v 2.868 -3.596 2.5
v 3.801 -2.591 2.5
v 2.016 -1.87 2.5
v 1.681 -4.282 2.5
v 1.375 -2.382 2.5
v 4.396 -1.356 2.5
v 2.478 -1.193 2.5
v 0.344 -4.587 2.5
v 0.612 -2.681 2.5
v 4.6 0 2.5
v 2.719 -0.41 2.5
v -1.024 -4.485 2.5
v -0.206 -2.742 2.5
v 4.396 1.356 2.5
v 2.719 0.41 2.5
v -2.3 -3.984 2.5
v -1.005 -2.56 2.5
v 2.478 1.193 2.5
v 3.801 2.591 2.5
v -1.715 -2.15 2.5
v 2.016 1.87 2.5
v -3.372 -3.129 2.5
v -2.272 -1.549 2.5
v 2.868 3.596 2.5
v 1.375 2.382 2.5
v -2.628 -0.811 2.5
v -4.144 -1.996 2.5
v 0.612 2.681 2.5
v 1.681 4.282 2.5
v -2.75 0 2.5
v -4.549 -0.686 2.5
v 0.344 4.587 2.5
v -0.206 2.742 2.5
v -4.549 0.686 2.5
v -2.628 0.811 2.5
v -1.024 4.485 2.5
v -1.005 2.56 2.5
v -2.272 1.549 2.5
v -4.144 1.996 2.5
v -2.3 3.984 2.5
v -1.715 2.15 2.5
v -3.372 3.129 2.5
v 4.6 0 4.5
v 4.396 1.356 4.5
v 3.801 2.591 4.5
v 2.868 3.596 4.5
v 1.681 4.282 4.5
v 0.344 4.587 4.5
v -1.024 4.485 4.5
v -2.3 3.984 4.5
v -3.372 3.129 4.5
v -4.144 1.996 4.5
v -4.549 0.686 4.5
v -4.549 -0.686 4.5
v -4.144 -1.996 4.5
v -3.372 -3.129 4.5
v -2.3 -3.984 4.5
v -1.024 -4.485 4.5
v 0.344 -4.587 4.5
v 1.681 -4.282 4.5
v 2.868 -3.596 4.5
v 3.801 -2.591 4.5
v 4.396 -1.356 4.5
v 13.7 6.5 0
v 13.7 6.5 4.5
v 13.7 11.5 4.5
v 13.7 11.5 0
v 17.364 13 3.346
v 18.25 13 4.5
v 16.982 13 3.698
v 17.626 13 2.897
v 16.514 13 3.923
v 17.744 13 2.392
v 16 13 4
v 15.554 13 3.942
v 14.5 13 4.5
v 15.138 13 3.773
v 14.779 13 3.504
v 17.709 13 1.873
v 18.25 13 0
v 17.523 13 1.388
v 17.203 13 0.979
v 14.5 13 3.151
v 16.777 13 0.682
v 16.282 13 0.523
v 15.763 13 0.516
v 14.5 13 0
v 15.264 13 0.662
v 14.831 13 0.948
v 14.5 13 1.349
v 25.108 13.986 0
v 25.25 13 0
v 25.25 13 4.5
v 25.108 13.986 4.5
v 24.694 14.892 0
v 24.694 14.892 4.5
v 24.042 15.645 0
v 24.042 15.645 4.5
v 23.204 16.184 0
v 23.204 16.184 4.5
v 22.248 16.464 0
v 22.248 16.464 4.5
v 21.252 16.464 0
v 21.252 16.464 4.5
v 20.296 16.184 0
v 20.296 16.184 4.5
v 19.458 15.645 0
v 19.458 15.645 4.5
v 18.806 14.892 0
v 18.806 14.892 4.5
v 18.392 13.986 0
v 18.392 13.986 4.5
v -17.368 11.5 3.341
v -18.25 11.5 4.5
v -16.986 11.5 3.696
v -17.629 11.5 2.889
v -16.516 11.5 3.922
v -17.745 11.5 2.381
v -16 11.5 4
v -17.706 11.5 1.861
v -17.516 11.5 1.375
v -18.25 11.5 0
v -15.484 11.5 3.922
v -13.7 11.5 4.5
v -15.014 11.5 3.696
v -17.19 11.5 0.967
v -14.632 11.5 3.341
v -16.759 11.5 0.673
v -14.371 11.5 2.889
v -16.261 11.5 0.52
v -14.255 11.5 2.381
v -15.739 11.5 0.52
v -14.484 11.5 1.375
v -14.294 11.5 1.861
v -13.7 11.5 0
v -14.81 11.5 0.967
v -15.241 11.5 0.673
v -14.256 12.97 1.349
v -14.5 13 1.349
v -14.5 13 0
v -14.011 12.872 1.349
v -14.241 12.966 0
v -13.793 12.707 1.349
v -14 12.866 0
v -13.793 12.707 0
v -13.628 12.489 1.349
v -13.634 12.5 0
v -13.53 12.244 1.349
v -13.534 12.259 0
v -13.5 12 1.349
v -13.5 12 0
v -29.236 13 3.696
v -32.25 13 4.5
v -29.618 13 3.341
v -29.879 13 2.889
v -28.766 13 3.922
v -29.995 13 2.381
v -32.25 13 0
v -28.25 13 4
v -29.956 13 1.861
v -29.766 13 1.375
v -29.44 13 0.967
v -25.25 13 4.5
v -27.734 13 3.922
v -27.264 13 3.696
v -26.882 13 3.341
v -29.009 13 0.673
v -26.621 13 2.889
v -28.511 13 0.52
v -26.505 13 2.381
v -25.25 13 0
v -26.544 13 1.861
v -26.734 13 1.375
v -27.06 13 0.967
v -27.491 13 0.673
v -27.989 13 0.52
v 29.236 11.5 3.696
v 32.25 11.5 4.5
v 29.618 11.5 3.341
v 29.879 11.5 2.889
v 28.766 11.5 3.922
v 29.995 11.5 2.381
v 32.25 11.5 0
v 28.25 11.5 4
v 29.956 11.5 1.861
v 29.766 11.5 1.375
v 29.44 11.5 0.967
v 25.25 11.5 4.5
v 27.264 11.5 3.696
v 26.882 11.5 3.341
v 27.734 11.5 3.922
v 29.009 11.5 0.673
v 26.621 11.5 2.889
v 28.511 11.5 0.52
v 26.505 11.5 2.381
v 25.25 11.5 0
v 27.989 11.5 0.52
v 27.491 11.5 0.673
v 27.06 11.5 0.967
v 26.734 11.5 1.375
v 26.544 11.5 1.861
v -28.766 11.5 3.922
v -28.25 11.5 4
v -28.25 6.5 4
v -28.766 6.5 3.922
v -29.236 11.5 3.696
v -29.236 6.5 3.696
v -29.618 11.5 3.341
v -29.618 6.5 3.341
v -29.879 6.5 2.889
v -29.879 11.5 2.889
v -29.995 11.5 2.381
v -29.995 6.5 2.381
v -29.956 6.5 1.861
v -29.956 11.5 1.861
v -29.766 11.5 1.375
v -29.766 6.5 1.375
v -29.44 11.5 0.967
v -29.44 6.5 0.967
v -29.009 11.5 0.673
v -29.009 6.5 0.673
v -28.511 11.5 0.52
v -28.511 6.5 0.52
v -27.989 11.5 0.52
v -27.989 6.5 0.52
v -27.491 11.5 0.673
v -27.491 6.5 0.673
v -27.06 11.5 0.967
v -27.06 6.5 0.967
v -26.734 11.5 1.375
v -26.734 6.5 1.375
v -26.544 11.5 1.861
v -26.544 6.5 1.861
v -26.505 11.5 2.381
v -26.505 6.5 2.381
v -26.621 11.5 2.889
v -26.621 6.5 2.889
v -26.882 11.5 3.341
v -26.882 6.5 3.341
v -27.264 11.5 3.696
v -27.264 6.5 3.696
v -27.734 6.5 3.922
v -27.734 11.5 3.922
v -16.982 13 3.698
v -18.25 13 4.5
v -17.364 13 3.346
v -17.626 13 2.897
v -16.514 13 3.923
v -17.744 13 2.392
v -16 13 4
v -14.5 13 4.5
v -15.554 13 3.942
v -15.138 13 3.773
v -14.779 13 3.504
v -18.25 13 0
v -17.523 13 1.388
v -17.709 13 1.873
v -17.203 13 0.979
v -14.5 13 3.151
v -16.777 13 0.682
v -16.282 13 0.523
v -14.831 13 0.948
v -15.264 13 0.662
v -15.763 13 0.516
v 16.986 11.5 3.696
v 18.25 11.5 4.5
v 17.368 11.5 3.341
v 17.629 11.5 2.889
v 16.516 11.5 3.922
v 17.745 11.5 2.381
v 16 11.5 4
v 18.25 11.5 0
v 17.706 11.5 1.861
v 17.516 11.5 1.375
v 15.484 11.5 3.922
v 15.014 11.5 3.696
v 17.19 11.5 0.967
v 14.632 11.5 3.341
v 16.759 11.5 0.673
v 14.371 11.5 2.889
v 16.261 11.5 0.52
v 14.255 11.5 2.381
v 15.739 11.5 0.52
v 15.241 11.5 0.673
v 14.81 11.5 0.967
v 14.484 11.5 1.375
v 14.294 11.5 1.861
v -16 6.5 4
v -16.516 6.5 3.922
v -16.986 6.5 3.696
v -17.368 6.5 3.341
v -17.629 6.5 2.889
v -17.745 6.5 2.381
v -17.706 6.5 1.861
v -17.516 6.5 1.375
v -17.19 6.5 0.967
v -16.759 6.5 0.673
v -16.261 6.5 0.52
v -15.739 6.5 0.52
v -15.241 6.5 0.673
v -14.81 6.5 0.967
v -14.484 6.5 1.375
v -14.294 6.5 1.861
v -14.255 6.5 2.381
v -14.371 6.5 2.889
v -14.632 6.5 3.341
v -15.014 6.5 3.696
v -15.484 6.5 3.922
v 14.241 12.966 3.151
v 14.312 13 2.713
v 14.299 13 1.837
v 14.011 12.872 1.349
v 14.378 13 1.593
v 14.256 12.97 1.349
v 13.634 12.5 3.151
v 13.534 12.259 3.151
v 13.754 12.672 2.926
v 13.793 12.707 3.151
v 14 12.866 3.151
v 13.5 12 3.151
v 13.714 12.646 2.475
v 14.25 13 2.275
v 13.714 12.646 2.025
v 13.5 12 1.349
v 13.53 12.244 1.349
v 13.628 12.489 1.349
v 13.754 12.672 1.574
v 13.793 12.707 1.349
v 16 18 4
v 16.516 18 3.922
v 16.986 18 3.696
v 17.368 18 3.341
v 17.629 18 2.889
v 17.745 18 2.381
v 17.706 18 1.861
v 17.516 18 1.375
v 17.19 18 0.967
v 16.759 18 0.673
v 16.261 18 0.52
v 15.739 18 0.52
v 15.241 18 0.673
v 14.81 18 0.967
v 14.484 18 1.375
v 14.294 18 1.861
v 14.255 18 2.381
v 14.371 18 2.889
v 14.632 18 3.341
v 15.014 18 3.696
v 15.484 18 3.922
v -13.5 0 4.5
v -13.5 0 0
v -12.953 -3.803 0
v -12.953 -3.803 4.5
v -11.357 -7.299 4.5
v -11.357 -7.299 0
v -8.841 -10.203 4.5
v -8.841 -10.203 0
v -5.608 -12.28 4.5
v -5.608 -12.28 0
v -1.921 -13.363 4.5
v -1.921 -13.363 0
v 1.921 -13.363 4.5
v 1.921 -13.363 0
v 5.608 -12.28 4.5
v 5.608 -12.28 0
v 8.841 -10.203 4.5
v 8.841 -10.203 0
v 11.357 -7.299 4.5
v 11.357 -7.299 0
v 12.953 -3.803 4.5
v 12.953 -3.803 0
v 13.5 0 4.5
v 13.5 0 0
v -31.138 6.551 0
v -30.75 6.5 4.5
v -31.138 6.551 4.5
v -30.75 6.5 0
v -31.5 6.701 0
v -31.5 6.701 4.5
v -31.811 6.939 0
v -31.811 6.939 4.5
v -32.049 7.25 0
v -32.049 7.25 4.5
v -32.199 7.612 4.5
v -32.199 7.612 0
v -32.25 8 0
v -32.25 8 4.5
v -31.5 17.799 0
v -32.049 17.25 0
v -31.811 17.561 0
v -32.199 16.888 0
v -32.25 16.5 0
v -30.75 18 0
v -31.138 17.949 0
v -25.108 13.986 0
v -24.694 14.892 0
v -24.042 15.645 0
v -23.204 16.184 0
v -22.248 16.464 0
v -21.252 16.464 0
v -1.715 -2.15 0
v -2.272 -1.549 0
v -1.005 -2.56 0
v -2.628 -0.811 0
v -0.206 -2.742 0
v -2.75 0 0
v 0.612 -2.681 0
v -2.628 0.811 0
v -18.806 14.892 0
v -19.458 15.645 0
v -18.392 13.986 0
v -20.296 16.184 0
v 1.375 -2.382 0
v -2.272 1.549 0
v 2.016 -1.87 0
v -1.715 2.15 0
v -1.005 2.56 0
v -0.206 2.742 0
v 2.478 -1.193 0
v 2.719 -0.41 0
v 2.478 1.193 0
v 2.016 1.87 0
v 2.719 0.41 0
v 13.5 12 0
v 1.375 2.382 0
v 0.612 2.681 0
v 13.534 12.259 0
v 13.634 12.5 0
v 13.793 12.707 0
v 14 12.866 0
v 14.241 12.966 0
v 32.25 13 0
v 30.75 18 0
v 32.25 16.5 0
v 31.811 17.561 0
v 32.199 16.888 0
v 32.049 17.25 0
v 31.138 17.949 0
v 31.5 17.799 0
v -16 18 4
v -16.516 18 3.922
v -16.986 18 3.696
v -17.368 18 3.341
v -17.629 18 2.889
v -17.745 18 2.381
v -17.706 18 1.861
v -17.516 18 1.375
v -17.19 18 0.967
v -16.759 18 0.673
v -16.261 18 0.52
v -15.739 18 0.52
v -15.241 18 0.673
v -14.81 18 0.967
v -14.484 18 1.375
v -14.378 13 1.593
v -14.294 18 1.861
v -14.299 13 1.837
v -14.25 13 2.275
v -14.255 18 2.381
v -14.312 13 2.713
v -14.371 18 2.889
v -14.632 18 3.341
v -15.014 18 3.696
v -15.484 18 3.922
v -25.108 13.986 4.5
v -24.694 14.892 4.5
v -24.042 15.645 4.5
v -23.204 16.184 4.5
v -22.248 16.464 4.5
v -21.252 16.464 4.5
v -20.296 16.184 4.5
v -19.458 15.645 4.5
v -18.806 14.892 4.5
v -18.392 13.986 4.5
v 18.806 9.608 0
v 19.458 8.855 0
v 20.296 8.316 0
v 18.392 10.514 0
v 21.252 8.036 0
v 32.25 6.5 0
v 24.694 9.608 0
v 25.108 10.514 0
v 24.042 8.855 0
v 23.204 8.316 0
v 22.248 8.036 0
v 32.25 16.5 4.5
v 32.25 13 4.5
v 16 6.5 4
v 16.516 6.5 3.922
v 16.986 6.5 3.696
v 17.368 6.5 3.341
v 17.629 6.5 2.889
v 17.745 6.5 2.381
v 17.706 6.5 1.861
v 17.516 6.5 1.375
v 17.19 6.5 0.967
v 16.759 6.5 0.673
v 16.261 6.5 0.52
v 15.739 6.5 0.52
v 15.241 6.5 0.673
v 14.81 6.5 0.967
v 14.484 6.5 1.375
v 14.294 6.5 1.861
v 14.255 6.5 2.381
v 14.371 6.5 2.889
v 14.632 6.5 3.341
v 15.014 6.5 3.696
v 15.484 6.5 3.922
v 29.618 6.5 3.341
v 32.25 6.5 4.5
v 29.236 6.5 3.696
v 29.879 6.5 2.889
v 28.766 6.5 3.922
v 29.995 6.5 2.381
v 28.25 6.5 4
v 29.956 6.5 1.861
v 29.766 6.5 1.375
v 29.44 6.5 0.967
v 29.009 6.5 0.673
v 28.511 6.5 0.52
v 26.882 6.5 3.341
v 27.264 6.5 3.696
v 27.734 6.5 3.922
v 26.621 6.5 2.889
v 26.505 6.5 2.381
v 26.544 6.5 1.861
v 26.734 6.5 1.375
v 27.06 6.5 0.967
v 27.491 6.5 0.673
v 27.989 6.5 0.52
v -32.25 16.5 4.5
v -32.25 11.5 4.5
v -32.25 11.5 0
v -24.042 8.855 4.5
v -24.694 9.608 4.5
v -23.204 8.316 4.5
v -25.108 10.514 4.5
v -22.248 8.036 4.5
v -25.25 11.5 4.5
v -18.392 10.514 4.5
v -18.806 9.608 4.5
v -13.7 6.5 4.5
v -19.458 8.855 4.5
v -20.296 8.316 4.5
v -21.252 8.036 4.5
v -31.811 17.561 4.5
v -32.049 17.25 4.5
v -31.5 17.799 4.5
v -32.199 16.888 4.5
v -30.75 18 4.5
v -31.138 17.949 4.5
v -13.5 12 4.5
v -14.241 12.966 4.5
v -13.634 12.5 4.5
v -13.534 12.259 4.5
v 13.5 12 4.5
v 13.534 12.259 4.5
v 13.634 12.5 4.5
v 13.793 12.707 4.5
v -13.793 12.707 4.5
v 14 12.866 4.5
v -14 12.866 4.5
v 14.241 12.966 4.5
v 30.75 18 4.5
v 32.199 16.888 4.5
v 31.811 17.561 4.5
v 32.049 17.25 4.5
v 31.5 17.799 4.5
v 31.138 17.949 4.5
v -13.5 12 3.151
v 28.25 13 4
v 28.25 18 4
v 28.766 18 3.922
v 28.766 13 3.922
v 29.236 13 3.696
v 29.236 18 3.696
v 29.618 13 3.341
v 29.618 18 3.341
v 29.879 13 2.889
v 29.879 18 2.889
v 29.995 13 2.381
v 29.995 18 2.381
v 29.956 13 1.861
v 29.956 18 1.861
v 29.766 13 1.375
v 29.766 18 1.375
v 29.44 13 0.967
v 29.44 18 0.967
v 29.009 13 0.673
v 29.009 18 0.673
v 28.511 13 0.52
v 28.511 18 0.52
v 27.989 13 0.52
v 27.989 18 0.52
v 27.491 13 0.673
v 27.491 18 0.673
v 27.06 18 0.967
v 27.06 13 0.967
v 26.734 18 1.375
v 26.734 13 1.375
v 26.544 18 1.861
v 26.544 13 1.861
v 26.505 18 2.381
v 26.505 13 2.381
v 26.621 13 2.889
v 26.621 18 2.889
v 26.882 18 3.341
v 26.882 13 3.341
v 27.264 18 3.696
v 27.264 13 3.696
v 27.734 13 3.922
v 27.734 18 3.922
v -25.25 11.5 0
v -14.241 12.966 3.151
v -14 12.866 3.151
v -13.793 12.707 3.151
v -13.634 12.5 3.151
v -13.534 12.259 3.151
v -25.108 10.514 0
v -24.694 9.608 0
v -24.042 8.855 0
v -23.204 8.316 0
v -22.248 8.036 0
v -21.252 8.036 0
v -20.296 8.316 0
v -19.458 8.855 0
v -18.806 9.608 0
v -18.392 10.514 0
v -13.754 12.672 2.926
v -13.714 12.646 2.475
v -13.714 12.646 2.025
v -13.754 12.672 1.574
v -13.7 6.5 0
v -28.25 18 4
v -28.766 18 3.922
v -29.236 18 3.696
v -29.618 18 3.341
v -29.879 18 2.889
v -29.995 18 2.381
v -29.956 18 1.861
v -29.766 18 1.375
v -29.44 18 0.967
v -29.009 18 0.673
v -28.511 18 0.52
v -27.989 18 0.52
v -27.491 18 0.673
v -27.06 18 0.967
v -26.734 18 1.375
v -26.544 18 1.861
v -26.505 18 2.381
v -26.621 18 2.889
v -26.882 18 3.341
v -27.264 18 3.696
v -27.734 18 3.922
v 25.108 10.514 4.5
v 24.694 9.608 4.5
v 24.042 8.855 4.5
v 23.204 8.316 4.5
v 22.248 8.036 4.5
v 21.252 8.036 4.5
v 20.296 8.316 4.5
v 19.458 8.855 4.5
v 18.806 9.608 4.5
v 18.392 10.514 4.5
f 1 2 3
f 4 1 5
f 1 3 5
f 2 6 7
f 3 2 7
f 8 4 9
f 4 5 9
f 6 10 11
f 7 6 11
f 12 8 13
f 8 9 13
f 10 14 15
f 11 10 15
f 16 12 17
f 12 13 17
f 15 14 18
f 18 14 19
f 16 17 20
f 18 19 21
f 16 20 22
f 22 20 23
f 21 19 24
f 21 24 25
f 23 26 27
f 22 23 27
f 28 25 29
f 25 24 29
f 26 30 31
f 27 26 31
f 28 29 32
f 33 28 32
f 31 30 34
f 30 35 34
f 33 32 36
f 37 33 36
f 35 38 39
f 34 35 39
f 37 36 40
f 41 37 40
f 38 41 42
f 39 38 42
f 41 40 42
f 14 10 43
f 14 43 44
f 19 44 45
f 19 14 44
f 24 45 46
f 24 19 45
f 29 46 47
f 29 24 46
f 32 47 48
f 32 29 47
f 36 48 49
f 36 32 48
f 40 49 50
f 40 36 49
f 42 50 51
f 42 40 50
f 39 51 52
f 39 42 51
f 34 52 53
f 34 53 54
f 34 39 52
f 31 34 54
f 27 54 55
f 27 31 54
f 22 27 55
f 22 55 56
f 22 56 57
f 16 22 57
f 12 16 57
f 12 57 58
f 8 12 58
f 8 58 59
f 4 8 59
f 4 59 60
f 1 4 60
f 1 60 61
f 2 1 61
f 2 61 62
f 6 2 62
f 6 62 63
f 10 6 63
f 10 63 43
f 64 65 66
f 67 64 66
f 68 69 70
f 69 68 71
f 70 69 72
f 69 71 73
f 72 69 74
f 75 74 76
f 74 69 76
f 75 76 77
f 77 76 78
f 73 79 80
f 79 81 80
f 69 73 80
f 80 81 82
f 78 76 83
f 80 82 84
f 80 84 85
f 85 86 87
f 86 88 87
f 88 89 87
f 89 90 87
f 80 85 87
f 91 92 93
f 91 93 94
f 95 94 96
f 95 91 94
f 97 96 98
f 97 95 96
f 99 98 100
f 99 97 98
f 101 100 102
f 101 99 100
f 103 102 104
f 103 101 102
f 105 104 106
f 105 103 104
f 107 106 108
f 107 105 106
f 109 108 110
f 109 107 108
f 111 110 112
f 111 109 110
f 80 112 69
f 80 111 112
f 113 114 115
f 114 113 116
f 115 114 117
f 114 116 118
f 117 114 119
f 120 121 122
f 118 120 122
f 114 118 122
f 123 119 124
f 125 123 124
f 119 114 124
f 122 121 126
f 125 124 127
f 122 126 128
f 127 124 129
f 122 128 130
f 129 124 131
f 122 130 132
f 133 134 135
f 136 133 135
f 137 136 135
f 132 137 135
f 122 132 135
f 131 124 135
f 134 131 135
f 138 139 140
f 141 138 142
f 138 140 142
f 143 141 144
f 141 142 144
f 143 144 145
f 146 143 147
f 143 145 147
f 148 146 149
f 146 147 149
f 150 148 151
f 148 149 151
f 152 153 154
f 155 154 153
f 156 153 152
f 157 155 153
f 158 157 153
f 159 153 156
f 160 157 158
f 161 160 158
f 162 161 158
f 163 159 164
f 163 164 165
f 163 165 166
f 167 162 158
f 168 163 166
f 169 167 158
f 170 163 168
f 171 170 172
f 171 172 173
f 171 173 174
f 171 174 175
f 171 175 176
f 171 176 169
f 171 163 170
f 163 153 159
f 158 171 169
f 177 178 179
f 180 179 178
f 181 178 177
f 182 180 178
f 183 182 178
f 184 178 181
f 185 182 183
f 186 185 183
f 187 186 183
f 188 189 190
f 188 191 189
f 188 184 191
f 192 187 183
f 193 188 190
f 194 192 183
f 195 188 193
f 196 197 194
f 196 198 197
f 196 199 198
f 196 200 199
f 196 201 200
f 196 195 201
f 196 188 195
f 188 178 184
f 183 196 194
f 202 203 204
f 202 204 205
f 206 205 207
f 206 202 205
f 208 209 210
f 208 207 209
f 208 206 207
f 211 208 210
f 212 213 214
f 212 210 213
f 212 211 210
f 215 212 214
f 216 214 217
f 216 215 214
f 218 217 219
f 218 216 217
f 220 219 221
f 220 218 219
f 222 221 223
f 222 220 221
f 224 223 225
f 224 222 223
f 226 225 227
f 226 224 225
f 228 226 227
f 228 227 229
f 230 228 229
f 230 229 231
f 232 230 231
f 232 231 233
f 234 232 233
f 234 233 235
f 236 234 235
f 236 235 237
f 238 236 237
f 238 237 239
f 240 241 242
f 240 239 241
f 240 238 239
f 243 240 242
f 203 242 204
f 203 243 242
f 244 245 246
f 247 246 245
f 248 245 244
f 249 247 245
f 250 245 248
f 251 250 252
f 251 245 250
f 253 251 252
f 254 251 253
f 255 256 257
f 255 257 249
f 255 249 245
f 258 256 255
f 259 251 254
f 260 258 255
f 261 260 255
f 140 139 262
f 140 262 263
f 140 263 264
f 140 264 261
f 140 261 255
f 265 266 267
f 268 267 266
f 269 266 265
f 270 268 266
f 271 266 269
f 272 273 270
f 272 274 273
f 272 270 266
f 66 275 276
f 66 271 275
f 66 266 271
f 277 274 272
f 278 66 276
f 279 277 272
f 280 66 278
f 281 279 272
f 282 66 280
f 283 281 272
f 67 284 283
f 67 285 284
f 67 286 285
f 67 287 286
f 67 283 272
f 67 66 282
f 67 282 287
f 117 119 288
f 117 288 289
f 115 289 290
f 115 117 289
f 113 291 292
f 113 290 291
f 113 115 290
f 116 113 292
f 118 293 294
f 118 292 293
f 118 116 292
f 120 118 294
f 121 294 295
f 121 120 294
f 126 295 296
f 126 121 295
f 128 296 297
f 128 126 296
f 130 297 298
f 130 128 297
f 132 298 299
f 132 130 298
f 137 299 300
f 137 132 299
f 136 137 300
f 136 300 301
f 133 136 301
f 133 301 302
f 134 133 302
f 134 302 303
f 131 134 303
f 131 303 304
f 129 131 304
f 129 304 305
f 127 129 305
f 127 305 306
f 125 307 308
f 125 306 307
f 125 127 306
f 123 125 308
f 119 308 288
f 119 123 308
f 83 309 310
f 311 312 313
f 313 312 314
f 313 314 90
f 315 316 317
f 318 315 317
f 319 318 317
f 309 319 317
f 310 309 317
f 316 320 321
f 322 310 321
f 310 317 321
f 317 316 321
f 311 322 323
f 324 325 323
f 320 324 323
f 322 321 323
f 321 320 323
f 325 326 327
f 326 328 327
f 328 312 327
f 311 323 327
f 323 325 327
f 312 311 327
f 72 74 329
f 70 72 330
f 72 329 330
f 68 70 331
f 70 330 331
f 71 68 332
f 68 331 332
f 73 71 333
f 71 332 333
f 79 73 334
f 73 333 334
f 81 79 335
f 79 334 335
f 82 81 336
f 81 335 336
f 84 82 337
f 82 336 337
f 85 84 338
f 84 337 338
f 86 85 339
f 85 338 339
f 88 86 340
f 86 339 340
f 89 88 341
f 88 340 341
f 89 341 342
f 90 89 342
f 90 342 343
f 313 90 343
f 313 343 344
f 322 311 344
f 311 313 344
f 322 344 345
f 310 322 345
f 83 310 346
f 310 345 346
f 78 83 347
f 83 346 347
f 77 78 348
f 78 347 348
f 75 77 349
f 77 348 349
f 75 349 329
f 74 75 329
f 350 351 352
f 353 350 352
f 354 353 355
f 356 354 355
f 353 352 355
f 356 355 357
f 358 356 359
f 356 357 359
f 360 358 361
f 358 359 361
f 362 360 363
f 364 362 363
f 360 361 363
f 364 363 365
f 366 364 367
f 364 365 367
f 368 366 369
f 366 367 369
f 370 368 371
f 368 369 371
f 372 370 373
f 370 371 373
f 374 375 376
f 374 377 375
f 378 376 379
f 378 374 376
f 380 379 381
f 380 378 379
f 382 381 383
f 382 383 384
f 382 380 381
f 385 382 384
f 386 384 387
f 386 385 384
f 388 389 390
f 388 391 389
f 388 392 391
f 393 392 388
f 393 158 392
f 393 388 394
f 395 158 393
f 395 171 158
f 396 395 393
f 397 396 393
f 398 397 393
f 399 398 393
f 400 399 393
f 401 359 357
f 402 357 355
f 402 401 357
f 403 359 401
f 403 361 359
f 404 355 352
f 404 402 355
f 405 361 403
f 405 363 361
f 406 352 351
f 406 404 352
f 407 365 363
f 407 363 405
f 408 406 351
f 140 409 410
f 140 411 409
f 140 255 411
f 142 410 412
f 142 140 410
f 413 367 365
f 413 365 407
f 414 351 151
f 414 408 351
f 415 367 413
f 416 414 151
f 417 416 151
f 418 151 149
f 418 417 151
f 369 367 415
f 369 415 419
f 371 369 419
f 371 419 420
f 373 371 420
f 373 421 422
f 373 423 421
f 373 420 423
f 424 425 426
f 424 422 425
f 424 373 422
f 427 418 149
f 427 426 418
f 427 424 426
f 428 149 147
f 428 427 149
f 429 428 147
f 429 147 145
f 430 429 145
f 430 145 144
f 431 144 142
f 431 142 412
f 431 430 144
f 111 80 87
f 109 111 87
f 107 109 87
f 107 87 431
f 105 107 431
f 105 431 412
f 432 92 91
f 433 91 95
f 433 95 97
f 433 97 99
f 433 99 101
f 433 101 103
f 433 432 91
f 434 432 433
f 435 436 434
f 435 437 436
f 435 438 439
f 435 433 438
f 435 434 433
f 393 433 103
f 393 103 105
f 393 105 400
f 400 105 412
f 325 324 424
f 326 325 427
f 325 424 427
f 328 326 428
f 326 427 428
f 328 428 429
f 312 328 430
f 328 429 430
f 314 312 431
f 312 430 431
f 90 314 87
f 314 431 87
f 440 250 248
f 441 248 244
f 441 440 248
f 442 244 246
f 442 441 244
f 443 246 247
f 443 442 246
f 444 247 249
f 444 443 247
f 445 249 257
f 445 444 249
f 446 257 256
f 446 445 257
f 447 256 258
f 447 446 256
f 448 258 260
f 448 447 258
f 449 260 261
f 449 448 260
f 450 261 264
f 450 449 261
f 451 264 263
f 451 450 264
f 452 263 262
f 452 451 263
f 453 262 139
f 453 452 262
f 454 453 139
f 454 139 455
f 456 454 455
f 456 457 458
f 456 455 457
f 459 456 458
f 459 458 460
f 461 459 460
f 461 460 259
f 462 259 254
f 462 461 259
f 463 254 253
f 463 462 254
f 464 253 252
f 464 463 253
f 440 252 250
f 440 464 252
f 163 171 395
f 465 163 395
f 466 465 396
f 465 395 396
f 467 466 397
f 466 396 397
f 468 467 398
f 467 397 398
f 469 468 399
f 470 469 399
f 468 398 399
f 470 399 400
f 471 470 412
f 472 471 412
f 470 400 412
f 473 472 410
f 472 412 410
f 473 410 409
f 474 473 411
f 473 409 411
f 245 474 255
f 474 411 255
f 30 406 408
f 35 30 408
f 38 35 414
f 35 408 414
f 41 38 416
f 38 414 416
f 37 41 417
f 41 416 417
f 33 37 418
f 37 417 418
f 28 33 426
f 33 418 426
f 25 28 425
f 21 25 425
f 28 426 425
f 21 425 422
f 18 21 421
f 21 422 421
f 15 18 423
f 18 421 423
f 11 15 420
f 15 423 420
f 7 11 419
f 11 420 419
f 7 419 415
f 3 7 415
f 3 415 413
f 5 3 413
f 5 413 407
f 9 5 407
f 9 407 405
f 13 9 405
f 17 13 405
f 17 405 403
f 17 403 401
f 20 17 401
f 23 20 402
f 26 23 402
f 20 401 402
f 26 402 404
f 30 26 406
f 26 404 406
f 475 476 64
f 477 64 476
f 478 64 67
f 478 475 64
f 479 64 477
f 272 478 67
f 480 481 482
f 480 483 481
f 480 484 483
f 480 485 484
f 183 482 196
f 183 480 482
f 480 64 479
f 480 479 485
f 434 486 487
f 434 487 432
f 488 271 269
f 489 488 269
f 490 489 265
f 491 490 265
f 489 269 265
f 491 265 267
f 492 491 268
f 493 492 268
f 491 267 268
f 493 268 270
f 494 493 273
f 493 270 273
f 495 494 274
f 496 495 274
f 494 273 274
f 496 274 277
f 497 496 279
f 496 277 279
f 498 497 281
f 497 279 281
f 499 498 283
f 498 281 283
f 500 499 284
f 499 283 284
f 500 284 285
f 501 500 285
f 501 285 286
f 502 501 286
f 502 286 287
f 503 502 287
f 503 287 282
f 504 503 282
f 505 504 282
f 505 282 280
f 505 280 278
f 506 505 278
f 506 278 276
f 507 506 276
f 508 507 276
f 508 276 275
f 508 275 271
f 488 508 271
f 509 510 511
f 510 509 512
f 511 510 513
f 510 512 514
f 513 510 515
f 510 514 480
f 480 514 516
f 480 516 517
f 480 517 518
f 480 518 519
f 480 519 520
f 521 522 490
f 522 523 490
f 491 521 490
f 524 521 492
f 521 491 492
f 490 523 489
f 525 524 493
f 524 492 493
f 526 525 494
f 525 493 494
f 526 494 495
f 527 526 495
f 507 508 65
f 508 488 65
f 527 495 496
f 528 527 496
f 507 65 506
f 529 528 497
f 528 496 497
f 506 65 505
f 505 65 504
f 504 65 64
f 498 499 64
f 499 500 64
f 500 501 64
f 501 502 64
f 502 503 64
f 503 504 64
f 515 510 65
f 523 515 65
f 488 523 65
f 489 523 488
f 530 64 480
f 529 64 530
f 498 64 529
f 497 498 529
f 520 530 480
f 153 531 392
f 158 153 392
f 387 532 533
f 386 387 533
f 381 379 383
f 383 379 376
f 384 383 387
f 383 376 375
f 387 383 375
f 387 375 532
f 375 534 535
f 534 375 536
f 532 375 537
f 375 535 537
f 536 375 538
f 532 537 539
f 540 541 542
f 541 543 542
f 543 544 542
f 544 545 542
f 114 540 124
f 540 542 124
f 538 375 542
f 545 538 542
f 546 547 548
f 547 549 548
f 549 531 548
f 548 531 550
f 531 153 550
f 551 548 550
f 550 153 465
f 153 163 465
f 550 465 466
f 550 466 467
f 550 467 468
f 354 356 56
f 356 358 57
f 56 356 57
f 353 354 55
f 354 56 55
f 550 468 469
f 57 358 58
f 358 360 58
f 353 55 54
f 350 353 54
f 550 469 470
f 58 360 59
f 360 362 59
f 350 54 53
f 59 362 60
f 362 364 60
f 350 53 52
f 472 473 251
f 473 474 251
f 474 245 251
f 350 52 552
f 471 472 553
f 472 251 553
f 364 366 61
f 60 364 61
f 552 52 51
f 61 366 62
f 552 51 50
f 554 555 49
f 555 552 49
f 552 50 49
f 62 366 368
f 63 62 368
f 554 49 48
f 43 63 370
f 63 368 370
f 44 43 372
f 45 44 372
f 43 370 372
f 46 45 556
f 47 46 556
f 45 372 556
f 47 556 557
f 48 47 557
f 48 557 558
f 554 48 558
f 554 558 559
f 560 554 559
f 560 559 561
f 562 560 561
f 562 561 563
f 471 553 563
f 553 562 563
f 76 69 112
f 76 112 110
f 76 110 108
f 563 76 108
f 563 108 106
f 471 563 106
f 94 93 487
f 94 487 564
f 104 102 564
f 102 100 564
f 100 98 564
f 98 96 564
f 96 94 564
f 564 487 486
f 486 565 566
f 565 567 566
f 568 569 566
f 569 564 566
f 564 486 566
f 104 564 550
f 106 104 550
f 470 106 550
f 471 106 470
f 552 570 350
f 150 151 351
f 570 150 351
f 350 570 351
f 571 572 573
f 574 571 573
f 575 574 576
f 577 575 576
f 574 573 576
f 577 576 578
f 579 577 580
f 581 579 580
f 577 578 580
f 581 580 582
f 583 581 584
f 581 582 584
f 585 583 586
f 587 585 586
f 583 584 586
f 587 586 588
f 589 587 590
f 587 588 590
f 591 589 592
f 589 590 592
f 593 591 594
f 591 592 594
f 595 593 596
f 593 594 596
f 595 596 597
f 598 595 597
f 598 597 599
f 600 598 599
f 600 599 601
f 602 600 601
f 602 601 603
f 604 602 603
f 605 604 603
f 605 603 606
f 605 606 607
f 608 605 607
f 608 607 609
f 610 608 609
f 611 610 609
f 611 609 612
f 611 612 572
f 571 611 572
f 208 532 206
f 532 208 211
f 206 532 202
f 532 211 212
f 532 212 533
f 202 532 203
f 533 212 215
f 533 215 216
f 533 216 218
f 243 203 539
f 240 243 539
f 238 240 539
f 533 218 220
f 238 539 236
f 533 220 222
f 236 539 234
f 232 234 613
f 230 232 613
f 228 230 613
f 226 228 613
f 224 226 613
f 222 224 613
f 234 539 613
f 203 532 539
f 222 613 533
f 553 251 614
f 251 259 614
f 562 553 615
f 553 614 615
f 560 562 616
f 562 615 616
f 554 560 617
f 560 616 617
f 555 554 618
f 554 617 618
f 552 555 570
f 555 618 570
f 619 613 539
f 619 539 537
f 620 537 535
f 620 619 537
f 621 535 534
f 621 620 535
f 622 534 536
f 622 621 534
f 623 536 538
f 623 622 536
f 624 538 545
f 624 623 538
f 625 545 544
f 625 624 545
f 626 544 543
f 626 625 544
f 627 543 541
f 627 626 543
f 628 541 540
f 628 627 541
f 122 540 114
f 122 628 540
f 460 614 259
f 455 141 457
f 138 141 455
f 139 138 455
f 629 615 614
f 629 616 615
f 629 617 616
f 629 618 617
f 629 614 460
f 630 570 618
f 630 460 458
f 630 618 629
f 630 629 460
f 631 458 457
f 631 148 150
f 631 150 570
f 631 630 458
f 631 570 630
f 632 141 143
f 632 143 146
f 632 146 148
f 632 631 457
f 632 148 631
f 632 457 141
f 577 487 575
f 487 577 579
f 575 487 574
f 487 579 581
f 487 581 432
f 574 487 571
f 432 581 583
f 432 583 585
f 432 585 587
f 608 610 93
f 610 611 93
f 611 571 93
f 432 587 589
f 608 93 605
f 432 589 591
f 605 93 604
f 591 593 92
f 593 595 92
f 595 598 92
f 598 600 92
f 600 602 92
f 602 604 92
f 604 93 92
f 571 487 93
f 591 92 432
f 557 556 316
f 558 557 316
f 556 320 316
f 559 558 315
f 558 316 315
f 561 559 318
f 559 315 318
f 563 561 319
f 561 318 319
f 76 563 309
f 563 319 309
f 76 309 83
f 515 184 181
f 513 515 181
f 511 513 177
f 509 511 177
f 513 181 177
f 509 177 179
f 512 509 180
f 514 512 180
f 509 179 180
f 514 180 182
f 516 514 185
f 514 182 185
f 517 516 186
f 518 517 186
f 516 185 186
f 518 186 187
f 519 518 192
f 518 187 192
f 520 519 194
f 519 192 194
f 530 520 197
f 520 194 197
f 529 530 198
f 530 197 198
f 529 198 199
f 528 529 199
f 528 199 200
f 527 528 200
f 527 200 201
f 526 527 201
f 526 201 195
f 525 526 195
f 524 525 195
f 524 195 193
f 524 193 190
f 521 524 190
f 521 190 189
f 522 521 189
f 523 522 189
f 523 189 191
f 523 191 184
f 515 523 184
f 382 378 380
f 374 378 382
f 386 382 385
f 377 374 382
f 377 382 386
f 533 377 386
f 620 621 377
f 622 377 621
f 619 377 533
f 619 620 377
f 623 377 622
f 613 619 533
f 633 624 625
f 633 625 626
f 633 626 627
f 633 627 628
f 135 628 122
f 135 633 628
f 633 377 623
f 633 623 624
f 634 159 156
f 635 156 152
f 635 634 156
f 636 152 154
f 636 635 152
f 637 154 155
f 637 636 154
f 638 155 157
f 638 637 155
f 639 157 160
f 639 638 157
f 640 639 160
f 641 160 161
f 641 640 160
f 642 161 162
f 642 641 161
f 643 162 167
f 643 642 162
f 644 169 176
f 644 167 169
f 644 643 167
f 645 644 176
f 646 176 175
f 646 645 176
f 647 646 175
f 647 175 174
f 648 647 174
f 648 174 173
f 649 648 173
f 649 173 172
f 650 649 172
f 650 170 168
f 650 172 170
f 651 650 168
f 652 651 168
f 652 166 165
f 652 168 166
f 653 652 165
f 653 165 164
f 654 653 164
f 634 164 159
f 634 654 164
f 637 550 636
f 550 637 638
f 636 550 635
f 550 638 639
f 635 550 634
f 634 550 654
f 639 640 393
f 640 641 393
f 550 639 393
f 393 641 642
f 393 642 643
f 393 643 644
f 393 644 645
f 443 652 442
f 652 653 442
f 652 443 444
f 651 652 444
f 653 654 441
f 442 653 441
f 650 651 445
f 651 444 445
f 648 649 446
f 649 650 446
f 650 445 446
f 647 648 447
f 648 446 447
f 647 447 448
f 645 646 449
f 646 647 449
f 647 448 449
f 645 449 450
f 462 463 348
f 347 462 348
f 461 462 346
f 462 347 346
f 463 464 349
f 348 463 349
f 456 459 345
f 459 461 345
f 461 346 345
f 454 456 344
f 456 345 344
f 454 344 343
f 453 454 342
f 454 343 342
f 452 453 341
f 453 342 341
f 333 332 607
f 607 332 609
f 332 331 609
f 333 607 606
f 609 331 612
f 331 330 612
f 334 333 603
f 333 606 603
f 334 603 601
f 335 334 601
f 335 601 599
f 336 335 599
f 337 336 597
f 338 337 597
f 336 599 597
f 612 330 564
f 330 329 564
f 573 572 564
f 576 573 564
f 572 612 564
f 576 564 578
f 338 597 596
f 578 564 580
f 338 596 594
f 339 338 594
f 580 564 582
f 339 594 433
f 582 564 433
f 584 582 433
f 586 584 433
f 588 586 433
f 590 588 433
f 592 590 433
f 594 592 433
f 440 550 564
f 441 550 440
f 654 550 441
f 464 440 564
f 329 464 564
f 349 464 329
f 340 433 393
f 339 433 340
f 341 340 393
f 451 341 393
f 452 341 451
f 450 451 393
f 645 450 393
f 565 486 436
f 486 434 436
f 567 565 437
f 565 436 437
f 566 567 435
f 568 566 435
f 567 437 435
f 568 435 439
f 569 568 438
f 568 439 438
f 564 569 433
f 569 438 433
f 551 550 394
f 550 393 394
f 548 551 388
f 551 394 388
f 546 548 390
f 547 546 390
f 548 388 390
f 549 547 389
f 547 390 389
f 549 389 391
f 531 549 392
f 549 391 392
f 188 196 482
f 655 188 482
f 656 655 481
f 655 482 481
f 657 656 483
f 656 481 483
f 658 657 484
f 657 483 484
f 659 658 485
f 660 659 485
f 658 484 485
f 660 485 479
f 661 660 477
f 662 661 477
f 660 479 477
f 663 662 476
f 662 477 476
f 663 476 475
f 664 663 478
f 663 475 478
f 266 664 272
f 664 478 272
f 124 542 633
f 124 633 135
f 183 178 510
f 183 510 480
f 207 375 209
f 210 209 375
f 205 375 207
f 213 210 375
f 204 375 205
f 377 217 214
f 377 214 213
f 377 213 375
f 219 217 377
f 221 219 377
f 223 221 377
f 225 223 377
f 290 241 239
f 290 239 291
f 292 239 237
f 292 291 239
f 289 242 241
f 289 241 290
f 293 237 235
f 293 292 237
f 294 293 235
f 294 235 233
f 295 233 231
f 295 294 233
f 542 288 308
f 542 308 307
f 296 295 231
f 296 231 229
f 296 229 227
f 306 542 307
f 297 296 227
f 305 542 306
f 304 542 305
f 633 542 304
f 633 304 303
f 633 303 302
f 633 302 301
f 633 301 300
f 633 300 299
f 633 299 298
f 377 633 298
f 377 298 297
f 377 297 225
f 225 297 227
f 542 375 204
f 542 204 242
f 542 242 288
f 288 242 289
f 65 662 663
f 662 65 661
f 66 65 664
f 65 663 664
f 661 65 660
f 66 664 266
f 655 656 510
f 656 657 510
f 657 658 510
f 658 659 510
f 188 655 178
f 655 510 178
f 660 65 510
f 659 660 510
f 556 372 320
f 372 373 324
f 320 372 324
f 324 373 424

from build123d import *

# Parameters (mm, degrees)
SKETCH_1_R          = 4.6
EXTRUDE_1_DEPTH     = 4.5
SKETCH_3_R          = 4.6
EXTRUDE_2_DEPTH     = 2.5
SKETCH_4_R          = 2.75
CUT_EXTRUDE_1_DEPTH = 2.5
SKETCH_5_W          = 4.5
SKETCH_5_H          = 5
EXTRUDE_3_DEPTH     = 18.75
CUT_EXTRUDE_2_DEPTH = 18.75
SKETCH_7_R          = 1.75
CUT_EXTRUDE_3_DEPTH = 18.75
SKETCH_9_R          = 1.75
CUT_EXTRUDE_8_DEPTH = 20
SKETCH_13_W         = 0.2
SKETCH_13_H         = 5
CUT_EXTRUDE_4_DEPTH = 10
FILLET_1_R          = 1.5
FILLET_2_R          = 1.5
FILLET_3_R          = 1


with BuildPart() as part:
    # 草图1 → 凸台-拉伸1 (new body)
    with BuildSketch(Plane.XY):
        with BuildLine():
            ThreePointArc((-13.5, 0), (0, -13.5), (13.5, 0))
            Line((13.5, 0), (13.5, 18))
            Line((13.5, 18), (-13.5, 18))
            Line((-13.5, 18), (-13.5, 0))
        make_face()
        Circle(SKETCH_1_R, mode=Mode.SUBTRACT)
    extrude(amount=EXTRUDE_1_DEPTH)

    # 草图3 → 凸台-拉伸2 (add)
    with BuildSketch(Plane(origin=(0, 0, 0), x_dir=(-1, 0, 0), z_dir=(0, 0, -1))):
        Circle(SKETCH_3_R)
    extrude(amount=-EXTRUDE_2_DEPTH)

    # 草图4 → 切除-拉伸1 (cut)
    with BuildSketch(Plane(origin=(0, 0, 0), x_dir=(-1, 0, 0), z_dir=(0, 0, -1))):
        Circle(SKETCH_4_R)
    extrude(amount=-CUT_EXTRUDE_1_DEPTH, mode=Mode.SUBTRACT)

    # 草图5 → 凸台-拉伸3 (add)
    with BuildSketch(Plane(origin=(13.5, 0, 0), x_dir=(0, 0, -1), z_dir=(1, 0, 0))):
        with Locations((-2.25, 15.5)):
            Rectangle(SKETCH_5_W, SKETCH_5_H)
        with Locations((-2.25, 9)):
            Rectangle(SKETCH_5_W, SKETCH_5_H)
    extrude_3 = extrude(amount=EXTRUDE_3_DEPTH)

    # 草图6 → 切除-拉伸2 (cut)
    with BuildSketch(Plane(origin=(0, 0, 0), x_dir=(-1, 0, 0), z_dir=(0, 0, -1))):
        with BuildLine():
            ThreePointArc((-25.25, 11.5), (-21.75, 8), (-18.25, 11.5))
            Line((-18.25, 11.5), (-25.25, 11.5))
        make_face()
        with BuildLine():
            ThreePointArc((-25.25, 13), (-21.75, 16.5), (-18.25, 13))
            Line((-18.25, 13), (-25.25, 13))
        make_face()
    cut_extrude_2 = extrude(amount=-CUT_EXTRUDE_2_DEPTH, mode=Mode.SUBTRACT)

    # 草图7 → 切除-拉伸3 (cut)
    with BuildSketch(Plane(origin=(0, 18, 0), x_dir=(1, 0, 0), z_dir=(0, 1, 0))):
        with Locations(Location((28.25, -2.25, 0), (0, 0, 270))):
            Circle(SKETCH_7_R)
    cut_extrude_3 = extrude(amount=-CUT_EXTRUDE_3_DEPTH, mode=Mode.SUBTRACT)

    # 草图9 → 切除-拉伸8 (cut)
    with BuildSketch(Plane(origin=(0, 18, 0), x_dir=(1, 0, 0), z_dir=(0, 1, 0))):
        with Locations(Location((16, -2.25, 0), (0, 0, 270))):
            Circle(SKETCH_9_R)
    cut_extrude_8 = extrude(amount=-CUT_EXTRUDE_8_DEPTH, mode=Mode.SUBTRACT)

    # 镜向3: 凸台-拉伸3, 切除-拉伸2, 切除-拉伸3, 切除-拉伸8 across plane
    add(extrude_3.mirror(Plane(origin=(0, 0, 0), x_dir=(0, 0, 1), z_dir=(1, 0, 0))))
    add(cut_extrude_2.mirror(Plane(origin=(0, 0, 0), x_dir=(0, 0, 1), z_dir=(1, 0, 0))), mode=Mode.SUBTRACT)
    add(cut_extrude_3.mirror(Plane(origin=(0, 0, 0), x_dir=(0, 0, 1), z_dir=(1, 0, 0))), mode=Mode.SUBTRACT)
    add(cut_extrude_8.mirror(Plane(origin=(0, 0, 0), x_dir=(0, 0, 1), z_dir=(1, 0, 0))), mode=Mode.SUBTRACT)

    # 草图13 → 切除-拉伸-薄壁4 (cut)
    with BuildSketch(Plane.XY.offset(4.5)):
        with Locations((-13.6, 9)):
            Rectangle(SKETCH_13_W, SKETCH_13_H)
        with Locations((13.6, 9)):
            Rectangle(SKETCH_13_W, SKETCH_13_H)
    extrude(amount=-CUT_EXTRUDE_4_DEPTH, mode=Mode.SUBTRACT)


with BuildPart() as cut_extrude_4_piece_1:
    # of the separate pieces the step leaves, piece 1, a body of its own (cut_extrude_4_pieces)
    add(part.part.solids().sort_by_distance((13.5, 0, 0))[0])

    # 圆角1
    fillet_1_edges = [cut_extrude_4_piece_1.edges().sort_by_distance(p)[0] for p in [
        (-32.25, 18, 2.25),
        (32.25, 18, 2.25),
    ]]
    fillet(fillet_1_edges, radius=FILLET_1_R)

    # 圆角3
    fillet_3_edges = [cut_extrude_4_piece_1.edges().sort_by_distance(p)[0] for p in [
        (-13.5, 13, 2.25),
        (13.5, 13, 2.25),
    ]]
    fillet(fillet_3_edges, radius=FILLET_3_R)


with BuildPart() as cut_extrude_4_piece_2:
    # of the separate pieces the step leaves, piece 2, a body of its own (cut_extrude_4_pieces)
    add(part.part.solids().sort_by_distance((-13.7, 6.5, 0))[0])

    # 圆角2
    fillet_2_edges = [cut_extrude_4_piece_2.edges().sort_by_distance(p)[0] for p in [
        (-32.25, 6.5, 2.25),
    ]]
    fillet(fillet_2_edges, radius=FILLET_2_R)


with BuildPart() as cut_extrude_4_piece_3:
    # of the separate pieces the step leaves, piece 3, a body of its own (cut_extrude_4_pieces)
    add(part.part.solids().sort_by_distance((13.7, 6.5, 4.5))[0])


solid = Compound([cut_extrude_4_piece_1.part, cut_extrude_4_piece_2.part, cut_extrude_4_piece_3.part])
